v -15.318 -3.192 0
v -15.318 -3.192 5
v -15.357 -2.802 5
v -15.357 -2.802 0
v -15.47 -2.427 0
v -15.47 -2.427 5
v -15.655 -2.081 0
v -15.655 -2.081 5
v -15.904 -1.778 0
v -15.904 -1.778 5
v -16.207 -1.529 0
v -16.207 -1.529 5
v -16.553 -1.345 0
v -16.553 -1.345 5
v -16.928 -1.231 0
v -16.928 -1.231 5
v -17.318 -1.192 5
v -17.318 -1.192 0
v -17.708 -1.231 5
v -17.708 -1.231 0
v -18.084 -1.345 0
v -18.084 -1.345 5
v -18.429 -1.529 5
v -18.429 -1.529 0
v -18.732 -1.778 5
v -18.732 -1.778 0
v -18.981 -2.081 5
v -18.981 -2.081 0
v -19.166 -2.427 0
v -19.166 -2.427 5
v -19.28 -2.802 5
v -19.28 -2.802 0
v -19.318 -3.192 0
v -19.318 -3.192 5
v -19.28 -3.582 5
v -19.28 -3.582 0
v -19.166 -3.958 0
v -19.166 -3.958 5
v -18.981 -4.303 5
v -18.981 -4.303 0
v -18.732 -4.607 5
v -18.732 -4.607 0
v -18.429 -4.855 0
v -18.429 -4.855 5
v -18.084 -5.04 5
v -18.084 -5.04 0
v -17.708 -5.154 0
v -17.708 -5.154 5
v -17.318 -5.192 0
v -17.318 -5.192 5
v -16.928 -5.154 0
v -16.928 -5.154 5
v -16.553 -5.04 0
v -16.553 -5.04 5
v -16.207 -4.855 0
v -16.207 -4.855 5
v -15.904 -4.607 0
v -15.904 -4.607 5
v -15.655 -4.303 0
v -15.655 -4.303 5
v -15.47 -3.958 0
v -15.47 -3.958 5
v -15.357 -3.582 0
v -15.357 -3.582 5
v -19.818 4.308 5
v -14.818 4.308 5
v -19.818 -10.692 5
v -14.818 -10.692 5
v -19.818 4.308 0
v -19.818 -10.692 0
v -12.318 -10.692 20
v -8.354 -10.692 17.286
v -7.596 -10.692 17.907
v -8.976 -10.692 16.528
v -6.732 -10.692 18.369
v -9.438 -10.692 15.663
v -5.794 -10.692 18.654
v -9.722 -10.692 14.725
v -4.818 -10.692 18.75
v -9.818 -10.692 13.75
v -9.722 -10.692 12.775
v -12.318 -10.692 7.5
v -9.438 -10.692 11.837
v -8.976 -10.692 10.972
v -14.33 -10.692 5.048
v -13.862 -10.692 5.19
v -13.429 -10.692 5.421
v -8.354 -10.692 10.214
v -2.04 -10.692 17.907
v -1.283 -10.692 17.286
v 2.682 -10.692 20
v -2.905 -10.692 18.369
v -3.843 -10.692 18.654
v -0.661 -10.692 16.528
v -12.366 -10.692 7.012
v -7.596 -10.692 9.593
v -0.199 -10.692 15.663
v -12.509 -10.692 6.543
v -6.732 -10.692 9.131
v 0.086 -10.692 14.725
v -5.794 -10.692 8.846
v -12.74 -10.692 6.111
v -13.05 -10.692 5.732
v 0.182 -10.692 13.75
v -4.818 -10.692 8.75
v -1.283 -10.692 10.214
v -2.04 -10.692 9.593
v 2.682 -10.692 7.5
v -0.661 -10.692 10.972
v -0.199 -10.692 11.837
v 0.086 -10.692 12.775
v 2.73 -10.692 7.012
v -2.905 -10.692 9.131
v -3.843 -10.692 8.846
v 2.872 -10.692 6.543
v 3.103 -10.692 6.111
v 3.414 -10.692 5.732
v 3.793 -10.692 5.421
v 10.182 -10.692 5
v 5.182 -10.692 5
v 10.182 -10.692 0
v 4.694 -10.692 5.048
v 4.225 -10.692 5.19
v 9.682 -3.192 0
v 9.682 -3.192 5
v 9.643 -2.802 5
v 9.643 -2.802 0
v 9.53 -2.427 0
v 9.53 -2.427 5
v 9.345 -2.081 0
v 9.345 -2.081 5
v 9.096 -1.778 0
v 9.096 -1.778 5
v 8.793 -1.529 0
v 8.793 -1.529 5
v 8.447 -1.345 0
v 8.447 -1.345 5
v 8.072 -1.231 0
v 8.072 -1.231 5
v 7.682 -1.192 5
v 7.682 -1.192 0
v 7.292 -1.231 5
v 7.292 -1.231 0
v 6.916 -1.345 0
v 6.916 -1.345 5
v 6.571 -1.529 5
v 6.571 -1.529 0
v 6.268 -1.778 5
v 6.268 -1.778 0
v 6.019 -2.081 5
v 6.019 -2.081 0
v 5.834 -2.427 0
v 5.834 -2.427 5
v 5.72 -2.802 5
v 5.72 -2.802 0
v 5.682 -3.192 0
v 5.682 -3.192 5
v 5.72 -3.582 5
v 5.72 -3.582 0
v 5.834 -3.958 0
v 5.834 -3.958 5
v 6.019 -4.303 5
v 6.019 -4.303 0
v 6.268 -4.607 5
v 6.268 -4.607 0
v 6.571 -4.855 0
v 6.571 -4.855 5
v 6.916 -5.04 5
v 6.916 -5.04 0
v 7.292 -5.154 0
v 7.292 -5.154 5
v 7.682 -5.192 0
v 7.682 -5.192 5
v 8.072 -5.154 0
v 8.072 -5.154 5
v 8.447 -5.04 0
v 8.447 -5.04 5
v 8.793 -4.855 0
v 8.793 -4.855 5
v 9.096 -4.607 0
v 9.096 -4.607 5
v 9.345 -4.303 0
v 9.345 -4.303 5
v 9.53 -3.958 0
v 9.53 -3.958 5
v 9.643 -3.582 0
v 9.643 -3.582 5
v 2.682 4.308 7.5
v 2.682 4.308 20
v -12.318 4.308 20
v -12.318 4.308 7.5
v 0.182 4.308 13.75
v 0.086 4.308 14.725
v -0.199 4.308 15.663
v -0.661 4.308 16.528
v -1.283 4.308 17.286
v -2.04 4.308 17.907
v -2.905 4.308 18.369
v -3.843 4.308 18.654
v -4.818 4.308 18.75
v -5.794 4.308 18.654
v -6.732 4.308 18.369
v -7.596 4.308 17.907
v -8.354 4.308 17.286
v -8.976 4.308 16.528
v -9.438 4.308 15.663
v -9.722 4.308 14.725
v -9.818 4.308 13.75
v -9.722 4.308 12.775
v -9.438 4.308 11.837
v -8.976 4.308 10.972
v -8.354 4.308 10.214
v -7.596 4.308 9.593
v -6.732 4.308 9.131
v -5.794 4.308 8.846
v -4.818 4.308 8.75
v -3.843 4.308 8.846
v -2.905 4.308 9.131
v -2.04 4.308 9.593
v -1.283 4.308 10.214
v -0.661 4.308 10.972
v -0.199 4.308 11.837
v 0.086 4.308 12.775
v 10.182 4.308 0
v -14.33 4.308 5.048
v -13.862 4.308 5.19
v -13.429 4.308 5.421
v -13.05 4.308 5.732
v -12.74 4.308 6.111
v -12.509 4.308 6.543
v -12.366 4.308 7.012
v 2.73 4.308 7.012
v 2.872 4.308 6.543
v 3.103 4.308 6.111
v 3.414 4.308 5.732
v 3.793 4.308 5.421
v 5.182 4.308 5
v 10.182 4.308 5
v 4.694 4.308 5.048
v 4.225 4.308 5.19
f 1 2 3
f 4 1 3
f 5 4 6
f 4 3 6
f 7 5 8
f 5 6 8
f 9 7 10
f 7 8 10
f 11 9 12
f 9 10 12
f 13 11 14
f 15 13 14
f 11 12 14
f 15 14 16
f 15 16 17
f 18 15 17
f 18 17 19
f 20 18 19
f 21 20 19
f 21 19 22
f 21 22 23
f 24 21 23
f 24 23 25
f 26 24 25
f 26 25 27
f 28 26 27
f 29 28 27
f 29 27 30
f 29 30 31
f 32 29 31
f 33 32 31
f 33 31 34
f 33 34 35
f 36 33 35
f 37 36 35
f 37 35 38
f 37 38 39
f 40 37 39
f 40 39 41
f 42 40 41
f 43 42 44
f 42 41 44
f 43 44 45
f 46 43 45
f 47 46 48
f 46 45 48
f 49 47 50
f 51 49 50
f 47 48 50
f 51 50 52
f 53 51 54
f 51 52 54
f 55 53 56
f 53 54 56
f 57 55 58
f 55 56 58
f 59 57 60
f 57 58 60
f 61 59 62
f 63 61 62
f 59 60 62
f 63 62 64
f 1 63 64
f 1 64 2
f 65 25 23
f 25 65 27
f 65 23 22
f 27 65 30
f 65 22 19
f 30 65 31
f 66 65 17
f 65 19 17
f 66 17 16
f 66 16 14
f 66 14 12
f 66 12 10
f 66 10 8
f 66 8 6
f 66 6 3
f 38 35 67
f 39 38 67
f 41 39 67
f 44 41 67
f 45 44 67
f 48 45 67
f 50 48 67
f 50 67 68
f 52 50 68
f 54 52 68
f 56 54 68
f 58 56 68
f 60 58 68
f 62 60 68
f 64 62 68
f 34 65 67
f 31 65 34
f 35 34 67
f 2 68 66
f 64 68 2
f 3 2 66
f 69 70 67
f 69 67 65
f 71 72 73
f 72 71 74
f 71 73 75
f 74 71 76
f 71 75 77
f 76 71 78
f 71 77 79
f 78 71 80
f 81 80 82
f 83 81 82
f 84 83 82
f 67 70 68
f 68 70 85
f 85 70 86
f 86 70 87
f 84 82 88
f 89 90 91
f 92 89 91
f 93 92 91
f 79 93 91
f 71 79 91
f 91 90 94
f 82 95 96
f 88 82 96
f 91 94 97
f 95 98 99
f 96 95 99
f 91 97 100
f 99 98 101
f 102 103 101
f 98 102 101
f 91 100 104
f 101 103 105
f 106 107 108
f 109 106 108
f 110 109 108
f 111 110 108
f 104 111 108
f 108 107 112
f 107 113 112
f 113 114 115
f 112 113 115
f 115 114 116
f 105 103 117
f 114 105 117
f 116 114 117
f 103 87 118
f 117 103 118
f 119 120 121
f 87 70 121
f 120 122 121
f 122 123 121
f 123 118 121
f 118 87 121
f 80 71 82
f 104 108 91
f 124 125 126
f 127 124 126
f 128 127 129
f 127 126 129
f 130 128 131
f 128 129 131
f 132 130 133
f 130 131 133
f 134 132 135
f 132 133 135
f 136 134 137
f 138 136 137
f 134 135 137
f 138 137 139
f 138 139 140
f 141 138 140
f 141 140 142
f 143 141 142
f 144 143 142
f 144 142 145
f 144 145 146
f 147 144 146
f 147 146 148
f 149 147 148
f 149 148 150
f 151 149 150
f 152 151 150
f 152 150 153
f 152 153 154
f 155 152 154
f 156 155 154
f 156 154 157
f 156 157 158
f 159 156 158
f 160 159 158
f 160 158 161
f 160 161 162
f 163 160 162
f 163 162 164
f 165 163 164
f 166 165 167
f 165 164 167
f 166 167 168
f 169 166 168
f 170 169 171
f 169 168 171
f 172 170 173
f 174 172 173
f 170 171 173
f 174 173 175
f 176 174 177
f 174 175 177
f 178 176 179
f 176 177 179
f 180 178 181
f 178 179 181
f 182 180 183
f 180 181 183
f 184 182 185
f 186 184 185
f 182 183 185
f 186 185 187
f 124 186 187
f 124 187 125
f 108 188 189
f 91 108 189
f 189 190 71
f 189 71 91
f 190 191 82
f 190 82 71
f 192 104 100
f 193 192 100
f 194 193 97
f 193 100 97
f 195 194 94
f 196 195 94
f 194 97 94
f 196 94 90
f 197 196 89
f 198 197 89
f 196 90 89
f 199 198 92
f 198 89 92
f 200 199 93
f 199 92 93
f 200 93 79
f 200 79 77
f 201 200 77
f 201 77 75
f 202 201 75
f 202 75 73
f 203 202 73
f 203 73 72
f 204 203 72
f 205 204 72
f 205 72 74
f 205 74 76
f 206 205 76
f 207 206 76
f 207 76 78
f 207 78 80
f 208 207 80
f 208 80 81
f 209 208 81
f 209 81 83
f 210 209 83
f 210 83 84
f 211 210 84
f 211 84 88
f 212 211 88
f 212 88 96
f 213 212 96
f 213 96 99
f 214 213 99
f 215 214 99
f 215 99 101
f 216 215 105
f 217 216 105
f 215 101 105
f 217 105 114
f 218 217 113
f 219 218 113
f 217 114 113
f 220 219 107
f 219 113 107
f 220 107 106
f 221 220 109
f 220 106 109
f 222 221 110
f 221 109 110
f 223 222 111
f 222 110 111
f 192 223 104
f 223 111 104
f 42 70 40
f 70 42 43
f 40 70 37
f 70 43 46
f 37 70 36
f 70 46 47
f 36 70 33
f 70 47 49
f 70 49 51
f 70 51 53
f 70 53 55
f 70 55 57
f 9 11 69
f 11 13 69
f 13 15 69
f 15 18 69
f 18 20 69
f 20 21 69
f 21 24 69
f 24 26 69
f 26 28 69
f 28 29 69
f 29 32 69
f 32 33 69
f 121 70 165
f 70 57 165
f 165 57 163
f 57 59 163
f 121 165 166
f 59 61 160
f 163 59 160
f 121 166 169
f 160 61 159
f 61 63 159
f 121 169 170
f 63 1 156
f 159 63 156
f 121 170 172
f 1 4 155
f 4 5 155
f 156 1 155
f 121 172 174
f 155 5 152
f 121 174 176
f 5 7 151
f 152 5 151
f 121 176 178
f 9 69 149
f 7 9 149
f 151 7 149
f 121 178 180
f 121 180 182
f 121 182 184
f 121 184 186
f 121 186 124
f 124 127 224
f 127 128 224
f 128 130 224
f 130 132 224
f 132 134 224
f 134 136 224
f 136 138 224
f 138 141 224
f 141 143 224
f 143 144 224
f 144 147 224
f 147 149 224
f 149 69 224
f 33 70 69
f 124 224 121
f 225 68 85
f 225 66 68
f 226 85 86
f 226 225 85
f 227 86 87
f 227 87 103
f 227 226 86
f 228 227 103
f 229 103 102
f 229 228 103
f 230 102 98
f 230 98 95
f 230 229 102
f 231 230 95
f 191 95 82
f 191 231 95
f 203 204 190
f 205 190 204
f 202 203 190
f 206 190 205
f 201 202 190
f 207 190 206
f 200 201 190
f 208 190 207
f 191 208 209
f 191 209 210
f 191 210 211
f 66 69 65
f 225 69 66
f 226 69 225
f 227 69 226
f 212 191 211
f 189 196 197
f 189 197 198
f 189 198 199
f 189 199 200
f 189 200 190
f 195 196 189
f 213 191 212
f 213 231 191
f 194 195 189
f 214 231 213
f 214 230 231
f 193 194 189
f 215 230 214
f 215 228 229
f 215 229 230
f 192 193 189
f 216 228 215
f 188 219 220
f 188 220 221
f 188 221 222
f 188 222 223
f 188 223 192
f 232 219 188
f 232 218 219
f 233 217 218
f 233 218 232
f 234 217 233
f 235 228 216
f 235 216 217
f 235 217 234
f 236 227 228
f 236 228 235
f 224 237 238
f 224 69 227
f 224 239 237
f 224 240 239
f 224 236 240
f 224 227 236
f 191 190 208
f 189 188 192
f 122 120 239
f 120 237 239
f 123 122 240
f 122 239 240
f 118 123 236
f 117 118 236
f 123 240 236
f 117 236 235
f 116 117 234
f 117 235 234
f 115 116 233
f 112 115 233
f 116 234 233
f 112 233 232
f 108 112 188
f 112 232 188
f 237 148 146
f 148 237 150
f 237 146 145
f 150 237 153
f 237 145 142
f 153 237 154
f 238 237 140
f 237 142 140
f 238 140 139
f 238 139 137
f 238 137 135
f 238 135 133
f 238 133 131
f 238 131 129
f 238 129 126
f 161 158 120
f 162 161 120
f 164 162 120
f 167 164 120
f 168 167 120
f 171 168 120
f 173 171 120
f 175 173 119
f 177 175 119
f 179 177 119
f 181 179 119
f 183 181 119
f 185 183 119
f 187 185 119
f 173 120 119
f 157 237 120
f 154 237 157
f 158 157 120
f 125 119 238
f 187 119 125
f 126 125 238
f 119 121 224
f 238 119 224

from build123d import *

# Parameters (mm, degrees)
F0_W      = 30
F0_H      = 15
F1_DEPTH  = 20
F2_W      = 7.5
F2_H      = 15
F3_DEPTH  = 15.001
F4_R      = 2.5
F5_R      = 5
F6_DEPTH  = 15.001
F7_R      = 2
F8_DEPTH  = 5.001
F9_R      = 2
F10_DEPTH = 5.001


with BuildPart() as f1:
    # F0 (on Top) → F1 (new body)
    with BuildSketch(Plane.XY):
        with Locations((-4.818223, -3.192319)):
            Rectangle(F0_W, F0_H)
    extrude(amount=F1_DEPTH)

    # F2 (on face) → F3 (cut, through all)
    with BuildSketch(Plane.XZ.offset(10.692319)):
        with Locations((-16.068223, 12.5)):
            Rectangle(F2_W, F2_H)
        with Locations((6.431777, 12.5)):
            Rectangle(F2_W, F2_H)
    extrude(amount=-F3_DEPTH, mode=Mode.SUBTRACT)

    # F4
    f4_edges = [f1.edges().sort_by_distance(p)[0] for p in [
        (2.681777, -3.192319, 5),
        (-12.318223, -3.192319, 5),
    ]]
    fillet(f4_edges, radius=F4_R)

    # F5 (on face) → F6 (cut, through all)
    with BuildSketch(Plane.XZ.offset(10.692319)):
        with Locations((-4.818223, 13.75)):
            Circle(F5_R)
    extrude(amount=-F6_DEPTH, mode=Mode.SUBTRACT)

    # F7 (on face) → F8 (cut, through all)
    with BuildSketch(Plane.XY.offset(5)):
        with Locations((7.681777, -3.192319)):
            Circle(F7_R)
    extrude(amount=-F8_DEPTH, mode=Mode.SUBTRACT)

    # F9 (on face) → F10 (cut, through all)
    with BuildSketch(Plane.XY.offset(5)):
        with Locations((-17.318223, -3.192319)):
            Circle(F9_R)
    extrude(amount=-F10_DEPTH, mode=Mode.SUBTRACT)


solid = f1.part
